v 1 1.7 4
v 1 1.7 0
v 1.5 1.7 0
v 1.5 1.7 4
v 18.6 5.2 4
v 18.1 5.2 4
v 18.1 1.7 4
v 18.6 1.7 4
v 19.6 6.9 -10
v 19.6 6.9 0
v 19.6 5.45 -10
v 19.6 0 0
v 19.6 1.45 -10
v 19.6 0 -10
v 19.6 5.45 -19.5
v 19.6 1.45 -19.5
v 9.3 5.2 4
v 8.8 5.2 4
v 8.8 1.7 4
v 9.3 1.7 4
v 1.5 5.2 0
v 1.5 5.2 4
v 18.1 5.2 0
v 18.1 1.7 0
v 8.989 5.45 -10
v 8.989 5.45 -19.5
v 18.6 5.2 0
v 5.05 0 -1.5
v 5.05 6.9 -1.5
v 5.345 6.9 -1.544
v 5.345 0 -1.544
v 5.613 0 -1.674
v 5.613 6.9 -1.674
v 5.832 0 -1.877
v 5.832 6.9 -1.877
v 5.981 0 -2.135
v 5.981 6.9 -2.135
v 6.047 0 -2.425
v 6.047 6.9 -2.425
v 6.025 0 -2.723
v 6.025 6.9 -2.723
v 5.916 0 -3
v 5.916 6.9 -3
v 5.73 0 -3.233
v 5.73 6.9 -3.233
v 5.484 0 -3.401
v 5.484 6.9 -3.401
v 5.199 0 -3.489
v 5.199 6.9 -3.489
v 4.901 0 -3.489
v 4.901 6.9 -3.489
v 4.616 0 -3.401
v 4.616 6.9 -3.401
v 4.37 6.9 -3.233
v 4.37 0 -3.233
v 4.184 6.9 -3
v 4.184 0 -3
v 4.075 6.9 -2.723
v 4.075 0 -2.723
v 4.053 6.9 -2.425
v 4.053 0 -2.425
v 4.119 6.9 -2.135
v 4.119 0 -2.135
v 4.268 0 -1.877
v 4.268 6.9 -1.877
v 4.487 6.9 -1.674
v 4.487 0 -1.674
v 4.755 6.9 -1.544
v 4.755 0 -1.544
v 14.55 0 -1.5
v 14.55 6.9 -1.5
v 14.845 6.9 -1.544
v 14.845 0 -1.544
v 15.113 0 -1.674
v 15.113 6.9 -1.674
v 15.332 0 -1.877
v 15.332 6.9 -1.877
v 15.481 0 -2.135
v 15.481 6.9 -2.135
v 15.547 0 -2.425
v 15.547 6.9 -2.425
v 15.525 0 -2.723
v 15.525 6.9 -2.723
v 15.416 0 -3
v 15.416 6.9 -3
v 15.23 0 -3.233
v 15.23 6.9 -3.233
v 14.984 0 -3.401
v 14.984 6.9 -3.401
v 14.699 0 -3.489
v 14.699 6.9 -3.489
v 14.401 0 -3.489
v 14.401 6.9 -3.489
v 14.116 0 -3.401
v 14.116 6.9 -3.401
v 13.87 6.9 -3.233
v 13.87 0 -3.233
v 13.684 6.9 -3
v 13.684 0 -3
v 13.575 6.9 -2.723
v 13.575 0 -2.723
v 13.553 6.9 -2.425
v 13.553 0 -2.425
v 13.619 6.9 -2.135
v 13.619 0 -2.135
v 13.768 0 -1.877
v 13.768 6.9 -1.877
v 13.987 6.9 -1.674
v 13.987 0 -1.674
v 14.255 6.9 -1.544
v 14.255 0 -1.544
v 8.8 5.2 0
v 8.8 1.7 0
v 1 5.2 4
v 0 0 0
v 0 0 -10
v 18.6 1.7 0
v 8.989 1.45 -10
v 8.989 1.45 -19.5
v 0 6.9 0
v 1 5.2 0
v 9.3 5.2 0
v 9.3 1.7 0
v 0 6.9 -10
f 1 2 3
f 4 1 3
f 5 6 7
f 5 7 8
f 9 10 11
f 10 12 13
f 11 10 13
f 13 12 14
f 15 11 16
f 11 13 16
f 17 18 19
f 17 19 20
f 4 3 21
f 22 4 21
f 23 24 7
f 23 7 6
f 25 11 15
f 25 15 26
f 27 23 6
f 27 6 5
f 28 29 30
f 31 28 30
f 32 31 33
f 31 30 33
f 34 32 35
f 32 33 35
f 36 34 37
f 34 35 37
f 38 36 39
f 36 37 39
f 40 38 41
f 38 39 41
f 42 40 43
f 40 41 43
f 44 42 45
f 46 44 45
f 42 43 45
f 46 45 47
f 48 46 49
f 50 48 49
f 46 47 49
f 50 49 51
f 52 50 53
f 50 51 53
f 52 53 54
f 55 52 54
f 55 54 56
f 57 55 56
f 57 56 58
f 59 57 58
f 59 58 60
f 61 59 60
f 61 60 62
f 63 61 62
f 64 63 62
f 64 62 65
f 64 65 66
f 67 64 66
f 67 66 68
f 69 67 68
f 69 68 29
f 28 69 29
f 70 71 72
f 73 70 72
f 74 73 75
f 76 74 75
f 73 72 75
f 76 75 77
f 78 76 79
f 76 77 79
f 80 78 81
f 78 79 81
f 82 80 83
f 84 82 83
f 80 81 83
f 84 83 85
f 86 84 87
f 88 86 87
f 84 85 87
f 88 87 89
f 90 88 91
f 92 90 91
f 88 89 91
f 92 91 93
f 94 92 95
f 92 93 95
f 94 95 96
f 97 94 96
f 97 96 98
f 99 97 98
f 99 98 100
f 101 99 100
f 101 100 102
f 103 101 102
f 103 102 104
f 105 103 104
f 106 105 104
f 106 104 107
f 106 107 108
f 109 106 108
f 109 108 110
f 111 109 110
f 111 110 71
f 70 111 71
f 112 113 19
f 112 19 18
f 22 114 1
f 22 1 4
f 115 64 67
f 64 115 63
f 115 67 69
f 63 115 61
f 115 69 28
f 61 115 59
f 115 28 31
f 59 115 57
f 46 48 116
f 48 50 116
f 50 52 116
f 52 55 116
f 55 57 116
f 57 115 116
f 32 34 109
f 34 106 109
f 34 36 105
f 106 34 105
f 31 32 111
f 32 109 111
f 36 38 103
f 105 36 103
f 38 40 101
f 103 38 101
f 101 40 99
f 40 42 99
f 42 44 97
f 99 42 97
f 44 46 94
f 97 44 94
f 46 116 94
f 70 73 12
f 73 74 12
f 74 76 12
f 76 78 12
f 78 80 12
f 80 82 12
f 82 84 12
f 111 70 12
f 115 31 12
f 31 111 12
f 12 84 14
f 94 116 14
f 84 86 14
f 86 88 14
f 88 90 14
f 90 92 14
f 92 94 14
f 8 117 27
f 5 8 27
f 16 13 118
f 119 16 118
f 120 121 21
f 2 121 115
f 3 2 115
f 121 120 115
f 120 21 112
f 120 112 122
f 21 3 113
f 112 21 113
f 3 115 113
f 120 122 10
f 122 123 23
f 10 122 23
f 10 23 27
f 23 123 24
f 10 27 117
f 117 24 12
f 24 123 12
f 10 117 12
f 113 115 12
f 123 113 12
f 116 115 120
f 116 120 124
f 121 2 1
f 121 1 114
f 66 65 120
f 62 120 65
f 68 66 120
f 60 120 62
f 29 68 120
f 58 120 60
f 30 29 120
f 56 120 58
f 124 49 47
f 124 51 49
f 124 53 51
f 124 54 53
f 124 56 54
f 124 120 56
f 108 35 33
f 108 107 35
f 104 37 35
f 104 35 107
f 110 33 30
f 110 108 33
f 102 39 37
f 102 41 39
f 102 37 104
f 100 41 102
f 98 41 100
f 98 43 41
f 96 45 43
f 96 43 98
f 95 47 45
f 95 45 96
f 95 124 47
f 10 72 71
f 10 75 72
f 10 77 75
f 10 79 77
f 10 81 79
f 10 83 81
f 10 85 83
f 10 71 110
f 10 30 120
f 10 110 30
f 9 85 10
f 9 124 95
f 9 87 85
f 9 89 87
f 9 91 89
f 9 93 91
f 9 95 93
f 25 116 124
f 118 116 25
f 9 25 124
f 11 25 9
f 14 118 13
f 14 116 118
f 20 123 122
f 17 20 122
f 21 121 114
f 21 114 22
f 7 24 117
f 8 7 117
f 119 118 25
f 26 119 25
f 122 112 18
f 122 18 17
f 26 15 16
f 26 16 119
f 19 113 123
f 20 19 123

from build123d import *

# Parameters (mm, degrees)
SKETCH1_W           = 19.6
SKETCH1_H           = 10
BOSS_EXTRUDE1_DEPTH = 6.9
SKETCH2_W           = 0.5
SKETCH2_H           = 3.5
BOSS_EXTRUDE2_DEPTH = 4
SKETCH3_W           = 10.611233712
SKETCH3_H           = 4
BOSS_EXTRUDE3_DEPTH = 9.5
SKETCH5_R           = 1
CUT_EXTRUDE1_DEPTH  = 29.495964627


with BuildPart() as part:
    # Sketch1 → Boss-Extrude1 (new body)
    with BuildSketch(Plane(origin=(0, 0, 0), x_dir=(1, 0, 0), z_dir=(0, 1, 0))):
        with Locations((9.8, 5)):
            Rectangle(SKETCH1_W, SKETCH1_H)
    extrude(amount=BOSS_EXTRUDE1_DEPTH)

    # Sketch2 → Boss-Extrude2 (add)
    with BuildSketch(Plane.XY):
        with Locations((1.25, 3.45)):
            Rectangle(SKETCH2_W, SKETCH2_H)
        with Locations((9.05, 3.45)):
            Rectangle(SKETCH2_W, SKETCH2_H)
        with Locations((18.35, 3.45)):
            Rectangle(SKETCH2_W, SKETCH2_H)
    extrude(amount=BOSS_EXTRUDE2_DEPTH)

    # Sketch3 → Boss-Extrude3 (add)
    with BuildSketch(Plane(origin=(0, 0, -10), x_dir=(-1, 0, 0), z_dir=(0, 0, -1))):
        with Locations((-14.294383144, 3.45)):
            Rectangle(SKETCH3_W, SKETCH3_H)
    extrude(amount=BOSS_EXTRUDE3_DEPTH)

    # Sketch5 → Cut-Extrude1 (cut, through all)
    with BuildSketch(Plane(origin=(0, 6.9, 0), x_dir=(1, 0, 0), z_dir=(0, 1, 0))):
        with Locations(Location((5.05, 2.5, 0), (0, 0, 270))):
            Circle(SKETCH5_R)
        with Locations(Location((14.55, 2.5, 0), (0, 0, 270))):
            Circle(SKETCH5_R)
    extrude(amount=-CUT_EXTRUDE1_DEPTH, mode=Mode.SUBTRACT)


solid = part.part
